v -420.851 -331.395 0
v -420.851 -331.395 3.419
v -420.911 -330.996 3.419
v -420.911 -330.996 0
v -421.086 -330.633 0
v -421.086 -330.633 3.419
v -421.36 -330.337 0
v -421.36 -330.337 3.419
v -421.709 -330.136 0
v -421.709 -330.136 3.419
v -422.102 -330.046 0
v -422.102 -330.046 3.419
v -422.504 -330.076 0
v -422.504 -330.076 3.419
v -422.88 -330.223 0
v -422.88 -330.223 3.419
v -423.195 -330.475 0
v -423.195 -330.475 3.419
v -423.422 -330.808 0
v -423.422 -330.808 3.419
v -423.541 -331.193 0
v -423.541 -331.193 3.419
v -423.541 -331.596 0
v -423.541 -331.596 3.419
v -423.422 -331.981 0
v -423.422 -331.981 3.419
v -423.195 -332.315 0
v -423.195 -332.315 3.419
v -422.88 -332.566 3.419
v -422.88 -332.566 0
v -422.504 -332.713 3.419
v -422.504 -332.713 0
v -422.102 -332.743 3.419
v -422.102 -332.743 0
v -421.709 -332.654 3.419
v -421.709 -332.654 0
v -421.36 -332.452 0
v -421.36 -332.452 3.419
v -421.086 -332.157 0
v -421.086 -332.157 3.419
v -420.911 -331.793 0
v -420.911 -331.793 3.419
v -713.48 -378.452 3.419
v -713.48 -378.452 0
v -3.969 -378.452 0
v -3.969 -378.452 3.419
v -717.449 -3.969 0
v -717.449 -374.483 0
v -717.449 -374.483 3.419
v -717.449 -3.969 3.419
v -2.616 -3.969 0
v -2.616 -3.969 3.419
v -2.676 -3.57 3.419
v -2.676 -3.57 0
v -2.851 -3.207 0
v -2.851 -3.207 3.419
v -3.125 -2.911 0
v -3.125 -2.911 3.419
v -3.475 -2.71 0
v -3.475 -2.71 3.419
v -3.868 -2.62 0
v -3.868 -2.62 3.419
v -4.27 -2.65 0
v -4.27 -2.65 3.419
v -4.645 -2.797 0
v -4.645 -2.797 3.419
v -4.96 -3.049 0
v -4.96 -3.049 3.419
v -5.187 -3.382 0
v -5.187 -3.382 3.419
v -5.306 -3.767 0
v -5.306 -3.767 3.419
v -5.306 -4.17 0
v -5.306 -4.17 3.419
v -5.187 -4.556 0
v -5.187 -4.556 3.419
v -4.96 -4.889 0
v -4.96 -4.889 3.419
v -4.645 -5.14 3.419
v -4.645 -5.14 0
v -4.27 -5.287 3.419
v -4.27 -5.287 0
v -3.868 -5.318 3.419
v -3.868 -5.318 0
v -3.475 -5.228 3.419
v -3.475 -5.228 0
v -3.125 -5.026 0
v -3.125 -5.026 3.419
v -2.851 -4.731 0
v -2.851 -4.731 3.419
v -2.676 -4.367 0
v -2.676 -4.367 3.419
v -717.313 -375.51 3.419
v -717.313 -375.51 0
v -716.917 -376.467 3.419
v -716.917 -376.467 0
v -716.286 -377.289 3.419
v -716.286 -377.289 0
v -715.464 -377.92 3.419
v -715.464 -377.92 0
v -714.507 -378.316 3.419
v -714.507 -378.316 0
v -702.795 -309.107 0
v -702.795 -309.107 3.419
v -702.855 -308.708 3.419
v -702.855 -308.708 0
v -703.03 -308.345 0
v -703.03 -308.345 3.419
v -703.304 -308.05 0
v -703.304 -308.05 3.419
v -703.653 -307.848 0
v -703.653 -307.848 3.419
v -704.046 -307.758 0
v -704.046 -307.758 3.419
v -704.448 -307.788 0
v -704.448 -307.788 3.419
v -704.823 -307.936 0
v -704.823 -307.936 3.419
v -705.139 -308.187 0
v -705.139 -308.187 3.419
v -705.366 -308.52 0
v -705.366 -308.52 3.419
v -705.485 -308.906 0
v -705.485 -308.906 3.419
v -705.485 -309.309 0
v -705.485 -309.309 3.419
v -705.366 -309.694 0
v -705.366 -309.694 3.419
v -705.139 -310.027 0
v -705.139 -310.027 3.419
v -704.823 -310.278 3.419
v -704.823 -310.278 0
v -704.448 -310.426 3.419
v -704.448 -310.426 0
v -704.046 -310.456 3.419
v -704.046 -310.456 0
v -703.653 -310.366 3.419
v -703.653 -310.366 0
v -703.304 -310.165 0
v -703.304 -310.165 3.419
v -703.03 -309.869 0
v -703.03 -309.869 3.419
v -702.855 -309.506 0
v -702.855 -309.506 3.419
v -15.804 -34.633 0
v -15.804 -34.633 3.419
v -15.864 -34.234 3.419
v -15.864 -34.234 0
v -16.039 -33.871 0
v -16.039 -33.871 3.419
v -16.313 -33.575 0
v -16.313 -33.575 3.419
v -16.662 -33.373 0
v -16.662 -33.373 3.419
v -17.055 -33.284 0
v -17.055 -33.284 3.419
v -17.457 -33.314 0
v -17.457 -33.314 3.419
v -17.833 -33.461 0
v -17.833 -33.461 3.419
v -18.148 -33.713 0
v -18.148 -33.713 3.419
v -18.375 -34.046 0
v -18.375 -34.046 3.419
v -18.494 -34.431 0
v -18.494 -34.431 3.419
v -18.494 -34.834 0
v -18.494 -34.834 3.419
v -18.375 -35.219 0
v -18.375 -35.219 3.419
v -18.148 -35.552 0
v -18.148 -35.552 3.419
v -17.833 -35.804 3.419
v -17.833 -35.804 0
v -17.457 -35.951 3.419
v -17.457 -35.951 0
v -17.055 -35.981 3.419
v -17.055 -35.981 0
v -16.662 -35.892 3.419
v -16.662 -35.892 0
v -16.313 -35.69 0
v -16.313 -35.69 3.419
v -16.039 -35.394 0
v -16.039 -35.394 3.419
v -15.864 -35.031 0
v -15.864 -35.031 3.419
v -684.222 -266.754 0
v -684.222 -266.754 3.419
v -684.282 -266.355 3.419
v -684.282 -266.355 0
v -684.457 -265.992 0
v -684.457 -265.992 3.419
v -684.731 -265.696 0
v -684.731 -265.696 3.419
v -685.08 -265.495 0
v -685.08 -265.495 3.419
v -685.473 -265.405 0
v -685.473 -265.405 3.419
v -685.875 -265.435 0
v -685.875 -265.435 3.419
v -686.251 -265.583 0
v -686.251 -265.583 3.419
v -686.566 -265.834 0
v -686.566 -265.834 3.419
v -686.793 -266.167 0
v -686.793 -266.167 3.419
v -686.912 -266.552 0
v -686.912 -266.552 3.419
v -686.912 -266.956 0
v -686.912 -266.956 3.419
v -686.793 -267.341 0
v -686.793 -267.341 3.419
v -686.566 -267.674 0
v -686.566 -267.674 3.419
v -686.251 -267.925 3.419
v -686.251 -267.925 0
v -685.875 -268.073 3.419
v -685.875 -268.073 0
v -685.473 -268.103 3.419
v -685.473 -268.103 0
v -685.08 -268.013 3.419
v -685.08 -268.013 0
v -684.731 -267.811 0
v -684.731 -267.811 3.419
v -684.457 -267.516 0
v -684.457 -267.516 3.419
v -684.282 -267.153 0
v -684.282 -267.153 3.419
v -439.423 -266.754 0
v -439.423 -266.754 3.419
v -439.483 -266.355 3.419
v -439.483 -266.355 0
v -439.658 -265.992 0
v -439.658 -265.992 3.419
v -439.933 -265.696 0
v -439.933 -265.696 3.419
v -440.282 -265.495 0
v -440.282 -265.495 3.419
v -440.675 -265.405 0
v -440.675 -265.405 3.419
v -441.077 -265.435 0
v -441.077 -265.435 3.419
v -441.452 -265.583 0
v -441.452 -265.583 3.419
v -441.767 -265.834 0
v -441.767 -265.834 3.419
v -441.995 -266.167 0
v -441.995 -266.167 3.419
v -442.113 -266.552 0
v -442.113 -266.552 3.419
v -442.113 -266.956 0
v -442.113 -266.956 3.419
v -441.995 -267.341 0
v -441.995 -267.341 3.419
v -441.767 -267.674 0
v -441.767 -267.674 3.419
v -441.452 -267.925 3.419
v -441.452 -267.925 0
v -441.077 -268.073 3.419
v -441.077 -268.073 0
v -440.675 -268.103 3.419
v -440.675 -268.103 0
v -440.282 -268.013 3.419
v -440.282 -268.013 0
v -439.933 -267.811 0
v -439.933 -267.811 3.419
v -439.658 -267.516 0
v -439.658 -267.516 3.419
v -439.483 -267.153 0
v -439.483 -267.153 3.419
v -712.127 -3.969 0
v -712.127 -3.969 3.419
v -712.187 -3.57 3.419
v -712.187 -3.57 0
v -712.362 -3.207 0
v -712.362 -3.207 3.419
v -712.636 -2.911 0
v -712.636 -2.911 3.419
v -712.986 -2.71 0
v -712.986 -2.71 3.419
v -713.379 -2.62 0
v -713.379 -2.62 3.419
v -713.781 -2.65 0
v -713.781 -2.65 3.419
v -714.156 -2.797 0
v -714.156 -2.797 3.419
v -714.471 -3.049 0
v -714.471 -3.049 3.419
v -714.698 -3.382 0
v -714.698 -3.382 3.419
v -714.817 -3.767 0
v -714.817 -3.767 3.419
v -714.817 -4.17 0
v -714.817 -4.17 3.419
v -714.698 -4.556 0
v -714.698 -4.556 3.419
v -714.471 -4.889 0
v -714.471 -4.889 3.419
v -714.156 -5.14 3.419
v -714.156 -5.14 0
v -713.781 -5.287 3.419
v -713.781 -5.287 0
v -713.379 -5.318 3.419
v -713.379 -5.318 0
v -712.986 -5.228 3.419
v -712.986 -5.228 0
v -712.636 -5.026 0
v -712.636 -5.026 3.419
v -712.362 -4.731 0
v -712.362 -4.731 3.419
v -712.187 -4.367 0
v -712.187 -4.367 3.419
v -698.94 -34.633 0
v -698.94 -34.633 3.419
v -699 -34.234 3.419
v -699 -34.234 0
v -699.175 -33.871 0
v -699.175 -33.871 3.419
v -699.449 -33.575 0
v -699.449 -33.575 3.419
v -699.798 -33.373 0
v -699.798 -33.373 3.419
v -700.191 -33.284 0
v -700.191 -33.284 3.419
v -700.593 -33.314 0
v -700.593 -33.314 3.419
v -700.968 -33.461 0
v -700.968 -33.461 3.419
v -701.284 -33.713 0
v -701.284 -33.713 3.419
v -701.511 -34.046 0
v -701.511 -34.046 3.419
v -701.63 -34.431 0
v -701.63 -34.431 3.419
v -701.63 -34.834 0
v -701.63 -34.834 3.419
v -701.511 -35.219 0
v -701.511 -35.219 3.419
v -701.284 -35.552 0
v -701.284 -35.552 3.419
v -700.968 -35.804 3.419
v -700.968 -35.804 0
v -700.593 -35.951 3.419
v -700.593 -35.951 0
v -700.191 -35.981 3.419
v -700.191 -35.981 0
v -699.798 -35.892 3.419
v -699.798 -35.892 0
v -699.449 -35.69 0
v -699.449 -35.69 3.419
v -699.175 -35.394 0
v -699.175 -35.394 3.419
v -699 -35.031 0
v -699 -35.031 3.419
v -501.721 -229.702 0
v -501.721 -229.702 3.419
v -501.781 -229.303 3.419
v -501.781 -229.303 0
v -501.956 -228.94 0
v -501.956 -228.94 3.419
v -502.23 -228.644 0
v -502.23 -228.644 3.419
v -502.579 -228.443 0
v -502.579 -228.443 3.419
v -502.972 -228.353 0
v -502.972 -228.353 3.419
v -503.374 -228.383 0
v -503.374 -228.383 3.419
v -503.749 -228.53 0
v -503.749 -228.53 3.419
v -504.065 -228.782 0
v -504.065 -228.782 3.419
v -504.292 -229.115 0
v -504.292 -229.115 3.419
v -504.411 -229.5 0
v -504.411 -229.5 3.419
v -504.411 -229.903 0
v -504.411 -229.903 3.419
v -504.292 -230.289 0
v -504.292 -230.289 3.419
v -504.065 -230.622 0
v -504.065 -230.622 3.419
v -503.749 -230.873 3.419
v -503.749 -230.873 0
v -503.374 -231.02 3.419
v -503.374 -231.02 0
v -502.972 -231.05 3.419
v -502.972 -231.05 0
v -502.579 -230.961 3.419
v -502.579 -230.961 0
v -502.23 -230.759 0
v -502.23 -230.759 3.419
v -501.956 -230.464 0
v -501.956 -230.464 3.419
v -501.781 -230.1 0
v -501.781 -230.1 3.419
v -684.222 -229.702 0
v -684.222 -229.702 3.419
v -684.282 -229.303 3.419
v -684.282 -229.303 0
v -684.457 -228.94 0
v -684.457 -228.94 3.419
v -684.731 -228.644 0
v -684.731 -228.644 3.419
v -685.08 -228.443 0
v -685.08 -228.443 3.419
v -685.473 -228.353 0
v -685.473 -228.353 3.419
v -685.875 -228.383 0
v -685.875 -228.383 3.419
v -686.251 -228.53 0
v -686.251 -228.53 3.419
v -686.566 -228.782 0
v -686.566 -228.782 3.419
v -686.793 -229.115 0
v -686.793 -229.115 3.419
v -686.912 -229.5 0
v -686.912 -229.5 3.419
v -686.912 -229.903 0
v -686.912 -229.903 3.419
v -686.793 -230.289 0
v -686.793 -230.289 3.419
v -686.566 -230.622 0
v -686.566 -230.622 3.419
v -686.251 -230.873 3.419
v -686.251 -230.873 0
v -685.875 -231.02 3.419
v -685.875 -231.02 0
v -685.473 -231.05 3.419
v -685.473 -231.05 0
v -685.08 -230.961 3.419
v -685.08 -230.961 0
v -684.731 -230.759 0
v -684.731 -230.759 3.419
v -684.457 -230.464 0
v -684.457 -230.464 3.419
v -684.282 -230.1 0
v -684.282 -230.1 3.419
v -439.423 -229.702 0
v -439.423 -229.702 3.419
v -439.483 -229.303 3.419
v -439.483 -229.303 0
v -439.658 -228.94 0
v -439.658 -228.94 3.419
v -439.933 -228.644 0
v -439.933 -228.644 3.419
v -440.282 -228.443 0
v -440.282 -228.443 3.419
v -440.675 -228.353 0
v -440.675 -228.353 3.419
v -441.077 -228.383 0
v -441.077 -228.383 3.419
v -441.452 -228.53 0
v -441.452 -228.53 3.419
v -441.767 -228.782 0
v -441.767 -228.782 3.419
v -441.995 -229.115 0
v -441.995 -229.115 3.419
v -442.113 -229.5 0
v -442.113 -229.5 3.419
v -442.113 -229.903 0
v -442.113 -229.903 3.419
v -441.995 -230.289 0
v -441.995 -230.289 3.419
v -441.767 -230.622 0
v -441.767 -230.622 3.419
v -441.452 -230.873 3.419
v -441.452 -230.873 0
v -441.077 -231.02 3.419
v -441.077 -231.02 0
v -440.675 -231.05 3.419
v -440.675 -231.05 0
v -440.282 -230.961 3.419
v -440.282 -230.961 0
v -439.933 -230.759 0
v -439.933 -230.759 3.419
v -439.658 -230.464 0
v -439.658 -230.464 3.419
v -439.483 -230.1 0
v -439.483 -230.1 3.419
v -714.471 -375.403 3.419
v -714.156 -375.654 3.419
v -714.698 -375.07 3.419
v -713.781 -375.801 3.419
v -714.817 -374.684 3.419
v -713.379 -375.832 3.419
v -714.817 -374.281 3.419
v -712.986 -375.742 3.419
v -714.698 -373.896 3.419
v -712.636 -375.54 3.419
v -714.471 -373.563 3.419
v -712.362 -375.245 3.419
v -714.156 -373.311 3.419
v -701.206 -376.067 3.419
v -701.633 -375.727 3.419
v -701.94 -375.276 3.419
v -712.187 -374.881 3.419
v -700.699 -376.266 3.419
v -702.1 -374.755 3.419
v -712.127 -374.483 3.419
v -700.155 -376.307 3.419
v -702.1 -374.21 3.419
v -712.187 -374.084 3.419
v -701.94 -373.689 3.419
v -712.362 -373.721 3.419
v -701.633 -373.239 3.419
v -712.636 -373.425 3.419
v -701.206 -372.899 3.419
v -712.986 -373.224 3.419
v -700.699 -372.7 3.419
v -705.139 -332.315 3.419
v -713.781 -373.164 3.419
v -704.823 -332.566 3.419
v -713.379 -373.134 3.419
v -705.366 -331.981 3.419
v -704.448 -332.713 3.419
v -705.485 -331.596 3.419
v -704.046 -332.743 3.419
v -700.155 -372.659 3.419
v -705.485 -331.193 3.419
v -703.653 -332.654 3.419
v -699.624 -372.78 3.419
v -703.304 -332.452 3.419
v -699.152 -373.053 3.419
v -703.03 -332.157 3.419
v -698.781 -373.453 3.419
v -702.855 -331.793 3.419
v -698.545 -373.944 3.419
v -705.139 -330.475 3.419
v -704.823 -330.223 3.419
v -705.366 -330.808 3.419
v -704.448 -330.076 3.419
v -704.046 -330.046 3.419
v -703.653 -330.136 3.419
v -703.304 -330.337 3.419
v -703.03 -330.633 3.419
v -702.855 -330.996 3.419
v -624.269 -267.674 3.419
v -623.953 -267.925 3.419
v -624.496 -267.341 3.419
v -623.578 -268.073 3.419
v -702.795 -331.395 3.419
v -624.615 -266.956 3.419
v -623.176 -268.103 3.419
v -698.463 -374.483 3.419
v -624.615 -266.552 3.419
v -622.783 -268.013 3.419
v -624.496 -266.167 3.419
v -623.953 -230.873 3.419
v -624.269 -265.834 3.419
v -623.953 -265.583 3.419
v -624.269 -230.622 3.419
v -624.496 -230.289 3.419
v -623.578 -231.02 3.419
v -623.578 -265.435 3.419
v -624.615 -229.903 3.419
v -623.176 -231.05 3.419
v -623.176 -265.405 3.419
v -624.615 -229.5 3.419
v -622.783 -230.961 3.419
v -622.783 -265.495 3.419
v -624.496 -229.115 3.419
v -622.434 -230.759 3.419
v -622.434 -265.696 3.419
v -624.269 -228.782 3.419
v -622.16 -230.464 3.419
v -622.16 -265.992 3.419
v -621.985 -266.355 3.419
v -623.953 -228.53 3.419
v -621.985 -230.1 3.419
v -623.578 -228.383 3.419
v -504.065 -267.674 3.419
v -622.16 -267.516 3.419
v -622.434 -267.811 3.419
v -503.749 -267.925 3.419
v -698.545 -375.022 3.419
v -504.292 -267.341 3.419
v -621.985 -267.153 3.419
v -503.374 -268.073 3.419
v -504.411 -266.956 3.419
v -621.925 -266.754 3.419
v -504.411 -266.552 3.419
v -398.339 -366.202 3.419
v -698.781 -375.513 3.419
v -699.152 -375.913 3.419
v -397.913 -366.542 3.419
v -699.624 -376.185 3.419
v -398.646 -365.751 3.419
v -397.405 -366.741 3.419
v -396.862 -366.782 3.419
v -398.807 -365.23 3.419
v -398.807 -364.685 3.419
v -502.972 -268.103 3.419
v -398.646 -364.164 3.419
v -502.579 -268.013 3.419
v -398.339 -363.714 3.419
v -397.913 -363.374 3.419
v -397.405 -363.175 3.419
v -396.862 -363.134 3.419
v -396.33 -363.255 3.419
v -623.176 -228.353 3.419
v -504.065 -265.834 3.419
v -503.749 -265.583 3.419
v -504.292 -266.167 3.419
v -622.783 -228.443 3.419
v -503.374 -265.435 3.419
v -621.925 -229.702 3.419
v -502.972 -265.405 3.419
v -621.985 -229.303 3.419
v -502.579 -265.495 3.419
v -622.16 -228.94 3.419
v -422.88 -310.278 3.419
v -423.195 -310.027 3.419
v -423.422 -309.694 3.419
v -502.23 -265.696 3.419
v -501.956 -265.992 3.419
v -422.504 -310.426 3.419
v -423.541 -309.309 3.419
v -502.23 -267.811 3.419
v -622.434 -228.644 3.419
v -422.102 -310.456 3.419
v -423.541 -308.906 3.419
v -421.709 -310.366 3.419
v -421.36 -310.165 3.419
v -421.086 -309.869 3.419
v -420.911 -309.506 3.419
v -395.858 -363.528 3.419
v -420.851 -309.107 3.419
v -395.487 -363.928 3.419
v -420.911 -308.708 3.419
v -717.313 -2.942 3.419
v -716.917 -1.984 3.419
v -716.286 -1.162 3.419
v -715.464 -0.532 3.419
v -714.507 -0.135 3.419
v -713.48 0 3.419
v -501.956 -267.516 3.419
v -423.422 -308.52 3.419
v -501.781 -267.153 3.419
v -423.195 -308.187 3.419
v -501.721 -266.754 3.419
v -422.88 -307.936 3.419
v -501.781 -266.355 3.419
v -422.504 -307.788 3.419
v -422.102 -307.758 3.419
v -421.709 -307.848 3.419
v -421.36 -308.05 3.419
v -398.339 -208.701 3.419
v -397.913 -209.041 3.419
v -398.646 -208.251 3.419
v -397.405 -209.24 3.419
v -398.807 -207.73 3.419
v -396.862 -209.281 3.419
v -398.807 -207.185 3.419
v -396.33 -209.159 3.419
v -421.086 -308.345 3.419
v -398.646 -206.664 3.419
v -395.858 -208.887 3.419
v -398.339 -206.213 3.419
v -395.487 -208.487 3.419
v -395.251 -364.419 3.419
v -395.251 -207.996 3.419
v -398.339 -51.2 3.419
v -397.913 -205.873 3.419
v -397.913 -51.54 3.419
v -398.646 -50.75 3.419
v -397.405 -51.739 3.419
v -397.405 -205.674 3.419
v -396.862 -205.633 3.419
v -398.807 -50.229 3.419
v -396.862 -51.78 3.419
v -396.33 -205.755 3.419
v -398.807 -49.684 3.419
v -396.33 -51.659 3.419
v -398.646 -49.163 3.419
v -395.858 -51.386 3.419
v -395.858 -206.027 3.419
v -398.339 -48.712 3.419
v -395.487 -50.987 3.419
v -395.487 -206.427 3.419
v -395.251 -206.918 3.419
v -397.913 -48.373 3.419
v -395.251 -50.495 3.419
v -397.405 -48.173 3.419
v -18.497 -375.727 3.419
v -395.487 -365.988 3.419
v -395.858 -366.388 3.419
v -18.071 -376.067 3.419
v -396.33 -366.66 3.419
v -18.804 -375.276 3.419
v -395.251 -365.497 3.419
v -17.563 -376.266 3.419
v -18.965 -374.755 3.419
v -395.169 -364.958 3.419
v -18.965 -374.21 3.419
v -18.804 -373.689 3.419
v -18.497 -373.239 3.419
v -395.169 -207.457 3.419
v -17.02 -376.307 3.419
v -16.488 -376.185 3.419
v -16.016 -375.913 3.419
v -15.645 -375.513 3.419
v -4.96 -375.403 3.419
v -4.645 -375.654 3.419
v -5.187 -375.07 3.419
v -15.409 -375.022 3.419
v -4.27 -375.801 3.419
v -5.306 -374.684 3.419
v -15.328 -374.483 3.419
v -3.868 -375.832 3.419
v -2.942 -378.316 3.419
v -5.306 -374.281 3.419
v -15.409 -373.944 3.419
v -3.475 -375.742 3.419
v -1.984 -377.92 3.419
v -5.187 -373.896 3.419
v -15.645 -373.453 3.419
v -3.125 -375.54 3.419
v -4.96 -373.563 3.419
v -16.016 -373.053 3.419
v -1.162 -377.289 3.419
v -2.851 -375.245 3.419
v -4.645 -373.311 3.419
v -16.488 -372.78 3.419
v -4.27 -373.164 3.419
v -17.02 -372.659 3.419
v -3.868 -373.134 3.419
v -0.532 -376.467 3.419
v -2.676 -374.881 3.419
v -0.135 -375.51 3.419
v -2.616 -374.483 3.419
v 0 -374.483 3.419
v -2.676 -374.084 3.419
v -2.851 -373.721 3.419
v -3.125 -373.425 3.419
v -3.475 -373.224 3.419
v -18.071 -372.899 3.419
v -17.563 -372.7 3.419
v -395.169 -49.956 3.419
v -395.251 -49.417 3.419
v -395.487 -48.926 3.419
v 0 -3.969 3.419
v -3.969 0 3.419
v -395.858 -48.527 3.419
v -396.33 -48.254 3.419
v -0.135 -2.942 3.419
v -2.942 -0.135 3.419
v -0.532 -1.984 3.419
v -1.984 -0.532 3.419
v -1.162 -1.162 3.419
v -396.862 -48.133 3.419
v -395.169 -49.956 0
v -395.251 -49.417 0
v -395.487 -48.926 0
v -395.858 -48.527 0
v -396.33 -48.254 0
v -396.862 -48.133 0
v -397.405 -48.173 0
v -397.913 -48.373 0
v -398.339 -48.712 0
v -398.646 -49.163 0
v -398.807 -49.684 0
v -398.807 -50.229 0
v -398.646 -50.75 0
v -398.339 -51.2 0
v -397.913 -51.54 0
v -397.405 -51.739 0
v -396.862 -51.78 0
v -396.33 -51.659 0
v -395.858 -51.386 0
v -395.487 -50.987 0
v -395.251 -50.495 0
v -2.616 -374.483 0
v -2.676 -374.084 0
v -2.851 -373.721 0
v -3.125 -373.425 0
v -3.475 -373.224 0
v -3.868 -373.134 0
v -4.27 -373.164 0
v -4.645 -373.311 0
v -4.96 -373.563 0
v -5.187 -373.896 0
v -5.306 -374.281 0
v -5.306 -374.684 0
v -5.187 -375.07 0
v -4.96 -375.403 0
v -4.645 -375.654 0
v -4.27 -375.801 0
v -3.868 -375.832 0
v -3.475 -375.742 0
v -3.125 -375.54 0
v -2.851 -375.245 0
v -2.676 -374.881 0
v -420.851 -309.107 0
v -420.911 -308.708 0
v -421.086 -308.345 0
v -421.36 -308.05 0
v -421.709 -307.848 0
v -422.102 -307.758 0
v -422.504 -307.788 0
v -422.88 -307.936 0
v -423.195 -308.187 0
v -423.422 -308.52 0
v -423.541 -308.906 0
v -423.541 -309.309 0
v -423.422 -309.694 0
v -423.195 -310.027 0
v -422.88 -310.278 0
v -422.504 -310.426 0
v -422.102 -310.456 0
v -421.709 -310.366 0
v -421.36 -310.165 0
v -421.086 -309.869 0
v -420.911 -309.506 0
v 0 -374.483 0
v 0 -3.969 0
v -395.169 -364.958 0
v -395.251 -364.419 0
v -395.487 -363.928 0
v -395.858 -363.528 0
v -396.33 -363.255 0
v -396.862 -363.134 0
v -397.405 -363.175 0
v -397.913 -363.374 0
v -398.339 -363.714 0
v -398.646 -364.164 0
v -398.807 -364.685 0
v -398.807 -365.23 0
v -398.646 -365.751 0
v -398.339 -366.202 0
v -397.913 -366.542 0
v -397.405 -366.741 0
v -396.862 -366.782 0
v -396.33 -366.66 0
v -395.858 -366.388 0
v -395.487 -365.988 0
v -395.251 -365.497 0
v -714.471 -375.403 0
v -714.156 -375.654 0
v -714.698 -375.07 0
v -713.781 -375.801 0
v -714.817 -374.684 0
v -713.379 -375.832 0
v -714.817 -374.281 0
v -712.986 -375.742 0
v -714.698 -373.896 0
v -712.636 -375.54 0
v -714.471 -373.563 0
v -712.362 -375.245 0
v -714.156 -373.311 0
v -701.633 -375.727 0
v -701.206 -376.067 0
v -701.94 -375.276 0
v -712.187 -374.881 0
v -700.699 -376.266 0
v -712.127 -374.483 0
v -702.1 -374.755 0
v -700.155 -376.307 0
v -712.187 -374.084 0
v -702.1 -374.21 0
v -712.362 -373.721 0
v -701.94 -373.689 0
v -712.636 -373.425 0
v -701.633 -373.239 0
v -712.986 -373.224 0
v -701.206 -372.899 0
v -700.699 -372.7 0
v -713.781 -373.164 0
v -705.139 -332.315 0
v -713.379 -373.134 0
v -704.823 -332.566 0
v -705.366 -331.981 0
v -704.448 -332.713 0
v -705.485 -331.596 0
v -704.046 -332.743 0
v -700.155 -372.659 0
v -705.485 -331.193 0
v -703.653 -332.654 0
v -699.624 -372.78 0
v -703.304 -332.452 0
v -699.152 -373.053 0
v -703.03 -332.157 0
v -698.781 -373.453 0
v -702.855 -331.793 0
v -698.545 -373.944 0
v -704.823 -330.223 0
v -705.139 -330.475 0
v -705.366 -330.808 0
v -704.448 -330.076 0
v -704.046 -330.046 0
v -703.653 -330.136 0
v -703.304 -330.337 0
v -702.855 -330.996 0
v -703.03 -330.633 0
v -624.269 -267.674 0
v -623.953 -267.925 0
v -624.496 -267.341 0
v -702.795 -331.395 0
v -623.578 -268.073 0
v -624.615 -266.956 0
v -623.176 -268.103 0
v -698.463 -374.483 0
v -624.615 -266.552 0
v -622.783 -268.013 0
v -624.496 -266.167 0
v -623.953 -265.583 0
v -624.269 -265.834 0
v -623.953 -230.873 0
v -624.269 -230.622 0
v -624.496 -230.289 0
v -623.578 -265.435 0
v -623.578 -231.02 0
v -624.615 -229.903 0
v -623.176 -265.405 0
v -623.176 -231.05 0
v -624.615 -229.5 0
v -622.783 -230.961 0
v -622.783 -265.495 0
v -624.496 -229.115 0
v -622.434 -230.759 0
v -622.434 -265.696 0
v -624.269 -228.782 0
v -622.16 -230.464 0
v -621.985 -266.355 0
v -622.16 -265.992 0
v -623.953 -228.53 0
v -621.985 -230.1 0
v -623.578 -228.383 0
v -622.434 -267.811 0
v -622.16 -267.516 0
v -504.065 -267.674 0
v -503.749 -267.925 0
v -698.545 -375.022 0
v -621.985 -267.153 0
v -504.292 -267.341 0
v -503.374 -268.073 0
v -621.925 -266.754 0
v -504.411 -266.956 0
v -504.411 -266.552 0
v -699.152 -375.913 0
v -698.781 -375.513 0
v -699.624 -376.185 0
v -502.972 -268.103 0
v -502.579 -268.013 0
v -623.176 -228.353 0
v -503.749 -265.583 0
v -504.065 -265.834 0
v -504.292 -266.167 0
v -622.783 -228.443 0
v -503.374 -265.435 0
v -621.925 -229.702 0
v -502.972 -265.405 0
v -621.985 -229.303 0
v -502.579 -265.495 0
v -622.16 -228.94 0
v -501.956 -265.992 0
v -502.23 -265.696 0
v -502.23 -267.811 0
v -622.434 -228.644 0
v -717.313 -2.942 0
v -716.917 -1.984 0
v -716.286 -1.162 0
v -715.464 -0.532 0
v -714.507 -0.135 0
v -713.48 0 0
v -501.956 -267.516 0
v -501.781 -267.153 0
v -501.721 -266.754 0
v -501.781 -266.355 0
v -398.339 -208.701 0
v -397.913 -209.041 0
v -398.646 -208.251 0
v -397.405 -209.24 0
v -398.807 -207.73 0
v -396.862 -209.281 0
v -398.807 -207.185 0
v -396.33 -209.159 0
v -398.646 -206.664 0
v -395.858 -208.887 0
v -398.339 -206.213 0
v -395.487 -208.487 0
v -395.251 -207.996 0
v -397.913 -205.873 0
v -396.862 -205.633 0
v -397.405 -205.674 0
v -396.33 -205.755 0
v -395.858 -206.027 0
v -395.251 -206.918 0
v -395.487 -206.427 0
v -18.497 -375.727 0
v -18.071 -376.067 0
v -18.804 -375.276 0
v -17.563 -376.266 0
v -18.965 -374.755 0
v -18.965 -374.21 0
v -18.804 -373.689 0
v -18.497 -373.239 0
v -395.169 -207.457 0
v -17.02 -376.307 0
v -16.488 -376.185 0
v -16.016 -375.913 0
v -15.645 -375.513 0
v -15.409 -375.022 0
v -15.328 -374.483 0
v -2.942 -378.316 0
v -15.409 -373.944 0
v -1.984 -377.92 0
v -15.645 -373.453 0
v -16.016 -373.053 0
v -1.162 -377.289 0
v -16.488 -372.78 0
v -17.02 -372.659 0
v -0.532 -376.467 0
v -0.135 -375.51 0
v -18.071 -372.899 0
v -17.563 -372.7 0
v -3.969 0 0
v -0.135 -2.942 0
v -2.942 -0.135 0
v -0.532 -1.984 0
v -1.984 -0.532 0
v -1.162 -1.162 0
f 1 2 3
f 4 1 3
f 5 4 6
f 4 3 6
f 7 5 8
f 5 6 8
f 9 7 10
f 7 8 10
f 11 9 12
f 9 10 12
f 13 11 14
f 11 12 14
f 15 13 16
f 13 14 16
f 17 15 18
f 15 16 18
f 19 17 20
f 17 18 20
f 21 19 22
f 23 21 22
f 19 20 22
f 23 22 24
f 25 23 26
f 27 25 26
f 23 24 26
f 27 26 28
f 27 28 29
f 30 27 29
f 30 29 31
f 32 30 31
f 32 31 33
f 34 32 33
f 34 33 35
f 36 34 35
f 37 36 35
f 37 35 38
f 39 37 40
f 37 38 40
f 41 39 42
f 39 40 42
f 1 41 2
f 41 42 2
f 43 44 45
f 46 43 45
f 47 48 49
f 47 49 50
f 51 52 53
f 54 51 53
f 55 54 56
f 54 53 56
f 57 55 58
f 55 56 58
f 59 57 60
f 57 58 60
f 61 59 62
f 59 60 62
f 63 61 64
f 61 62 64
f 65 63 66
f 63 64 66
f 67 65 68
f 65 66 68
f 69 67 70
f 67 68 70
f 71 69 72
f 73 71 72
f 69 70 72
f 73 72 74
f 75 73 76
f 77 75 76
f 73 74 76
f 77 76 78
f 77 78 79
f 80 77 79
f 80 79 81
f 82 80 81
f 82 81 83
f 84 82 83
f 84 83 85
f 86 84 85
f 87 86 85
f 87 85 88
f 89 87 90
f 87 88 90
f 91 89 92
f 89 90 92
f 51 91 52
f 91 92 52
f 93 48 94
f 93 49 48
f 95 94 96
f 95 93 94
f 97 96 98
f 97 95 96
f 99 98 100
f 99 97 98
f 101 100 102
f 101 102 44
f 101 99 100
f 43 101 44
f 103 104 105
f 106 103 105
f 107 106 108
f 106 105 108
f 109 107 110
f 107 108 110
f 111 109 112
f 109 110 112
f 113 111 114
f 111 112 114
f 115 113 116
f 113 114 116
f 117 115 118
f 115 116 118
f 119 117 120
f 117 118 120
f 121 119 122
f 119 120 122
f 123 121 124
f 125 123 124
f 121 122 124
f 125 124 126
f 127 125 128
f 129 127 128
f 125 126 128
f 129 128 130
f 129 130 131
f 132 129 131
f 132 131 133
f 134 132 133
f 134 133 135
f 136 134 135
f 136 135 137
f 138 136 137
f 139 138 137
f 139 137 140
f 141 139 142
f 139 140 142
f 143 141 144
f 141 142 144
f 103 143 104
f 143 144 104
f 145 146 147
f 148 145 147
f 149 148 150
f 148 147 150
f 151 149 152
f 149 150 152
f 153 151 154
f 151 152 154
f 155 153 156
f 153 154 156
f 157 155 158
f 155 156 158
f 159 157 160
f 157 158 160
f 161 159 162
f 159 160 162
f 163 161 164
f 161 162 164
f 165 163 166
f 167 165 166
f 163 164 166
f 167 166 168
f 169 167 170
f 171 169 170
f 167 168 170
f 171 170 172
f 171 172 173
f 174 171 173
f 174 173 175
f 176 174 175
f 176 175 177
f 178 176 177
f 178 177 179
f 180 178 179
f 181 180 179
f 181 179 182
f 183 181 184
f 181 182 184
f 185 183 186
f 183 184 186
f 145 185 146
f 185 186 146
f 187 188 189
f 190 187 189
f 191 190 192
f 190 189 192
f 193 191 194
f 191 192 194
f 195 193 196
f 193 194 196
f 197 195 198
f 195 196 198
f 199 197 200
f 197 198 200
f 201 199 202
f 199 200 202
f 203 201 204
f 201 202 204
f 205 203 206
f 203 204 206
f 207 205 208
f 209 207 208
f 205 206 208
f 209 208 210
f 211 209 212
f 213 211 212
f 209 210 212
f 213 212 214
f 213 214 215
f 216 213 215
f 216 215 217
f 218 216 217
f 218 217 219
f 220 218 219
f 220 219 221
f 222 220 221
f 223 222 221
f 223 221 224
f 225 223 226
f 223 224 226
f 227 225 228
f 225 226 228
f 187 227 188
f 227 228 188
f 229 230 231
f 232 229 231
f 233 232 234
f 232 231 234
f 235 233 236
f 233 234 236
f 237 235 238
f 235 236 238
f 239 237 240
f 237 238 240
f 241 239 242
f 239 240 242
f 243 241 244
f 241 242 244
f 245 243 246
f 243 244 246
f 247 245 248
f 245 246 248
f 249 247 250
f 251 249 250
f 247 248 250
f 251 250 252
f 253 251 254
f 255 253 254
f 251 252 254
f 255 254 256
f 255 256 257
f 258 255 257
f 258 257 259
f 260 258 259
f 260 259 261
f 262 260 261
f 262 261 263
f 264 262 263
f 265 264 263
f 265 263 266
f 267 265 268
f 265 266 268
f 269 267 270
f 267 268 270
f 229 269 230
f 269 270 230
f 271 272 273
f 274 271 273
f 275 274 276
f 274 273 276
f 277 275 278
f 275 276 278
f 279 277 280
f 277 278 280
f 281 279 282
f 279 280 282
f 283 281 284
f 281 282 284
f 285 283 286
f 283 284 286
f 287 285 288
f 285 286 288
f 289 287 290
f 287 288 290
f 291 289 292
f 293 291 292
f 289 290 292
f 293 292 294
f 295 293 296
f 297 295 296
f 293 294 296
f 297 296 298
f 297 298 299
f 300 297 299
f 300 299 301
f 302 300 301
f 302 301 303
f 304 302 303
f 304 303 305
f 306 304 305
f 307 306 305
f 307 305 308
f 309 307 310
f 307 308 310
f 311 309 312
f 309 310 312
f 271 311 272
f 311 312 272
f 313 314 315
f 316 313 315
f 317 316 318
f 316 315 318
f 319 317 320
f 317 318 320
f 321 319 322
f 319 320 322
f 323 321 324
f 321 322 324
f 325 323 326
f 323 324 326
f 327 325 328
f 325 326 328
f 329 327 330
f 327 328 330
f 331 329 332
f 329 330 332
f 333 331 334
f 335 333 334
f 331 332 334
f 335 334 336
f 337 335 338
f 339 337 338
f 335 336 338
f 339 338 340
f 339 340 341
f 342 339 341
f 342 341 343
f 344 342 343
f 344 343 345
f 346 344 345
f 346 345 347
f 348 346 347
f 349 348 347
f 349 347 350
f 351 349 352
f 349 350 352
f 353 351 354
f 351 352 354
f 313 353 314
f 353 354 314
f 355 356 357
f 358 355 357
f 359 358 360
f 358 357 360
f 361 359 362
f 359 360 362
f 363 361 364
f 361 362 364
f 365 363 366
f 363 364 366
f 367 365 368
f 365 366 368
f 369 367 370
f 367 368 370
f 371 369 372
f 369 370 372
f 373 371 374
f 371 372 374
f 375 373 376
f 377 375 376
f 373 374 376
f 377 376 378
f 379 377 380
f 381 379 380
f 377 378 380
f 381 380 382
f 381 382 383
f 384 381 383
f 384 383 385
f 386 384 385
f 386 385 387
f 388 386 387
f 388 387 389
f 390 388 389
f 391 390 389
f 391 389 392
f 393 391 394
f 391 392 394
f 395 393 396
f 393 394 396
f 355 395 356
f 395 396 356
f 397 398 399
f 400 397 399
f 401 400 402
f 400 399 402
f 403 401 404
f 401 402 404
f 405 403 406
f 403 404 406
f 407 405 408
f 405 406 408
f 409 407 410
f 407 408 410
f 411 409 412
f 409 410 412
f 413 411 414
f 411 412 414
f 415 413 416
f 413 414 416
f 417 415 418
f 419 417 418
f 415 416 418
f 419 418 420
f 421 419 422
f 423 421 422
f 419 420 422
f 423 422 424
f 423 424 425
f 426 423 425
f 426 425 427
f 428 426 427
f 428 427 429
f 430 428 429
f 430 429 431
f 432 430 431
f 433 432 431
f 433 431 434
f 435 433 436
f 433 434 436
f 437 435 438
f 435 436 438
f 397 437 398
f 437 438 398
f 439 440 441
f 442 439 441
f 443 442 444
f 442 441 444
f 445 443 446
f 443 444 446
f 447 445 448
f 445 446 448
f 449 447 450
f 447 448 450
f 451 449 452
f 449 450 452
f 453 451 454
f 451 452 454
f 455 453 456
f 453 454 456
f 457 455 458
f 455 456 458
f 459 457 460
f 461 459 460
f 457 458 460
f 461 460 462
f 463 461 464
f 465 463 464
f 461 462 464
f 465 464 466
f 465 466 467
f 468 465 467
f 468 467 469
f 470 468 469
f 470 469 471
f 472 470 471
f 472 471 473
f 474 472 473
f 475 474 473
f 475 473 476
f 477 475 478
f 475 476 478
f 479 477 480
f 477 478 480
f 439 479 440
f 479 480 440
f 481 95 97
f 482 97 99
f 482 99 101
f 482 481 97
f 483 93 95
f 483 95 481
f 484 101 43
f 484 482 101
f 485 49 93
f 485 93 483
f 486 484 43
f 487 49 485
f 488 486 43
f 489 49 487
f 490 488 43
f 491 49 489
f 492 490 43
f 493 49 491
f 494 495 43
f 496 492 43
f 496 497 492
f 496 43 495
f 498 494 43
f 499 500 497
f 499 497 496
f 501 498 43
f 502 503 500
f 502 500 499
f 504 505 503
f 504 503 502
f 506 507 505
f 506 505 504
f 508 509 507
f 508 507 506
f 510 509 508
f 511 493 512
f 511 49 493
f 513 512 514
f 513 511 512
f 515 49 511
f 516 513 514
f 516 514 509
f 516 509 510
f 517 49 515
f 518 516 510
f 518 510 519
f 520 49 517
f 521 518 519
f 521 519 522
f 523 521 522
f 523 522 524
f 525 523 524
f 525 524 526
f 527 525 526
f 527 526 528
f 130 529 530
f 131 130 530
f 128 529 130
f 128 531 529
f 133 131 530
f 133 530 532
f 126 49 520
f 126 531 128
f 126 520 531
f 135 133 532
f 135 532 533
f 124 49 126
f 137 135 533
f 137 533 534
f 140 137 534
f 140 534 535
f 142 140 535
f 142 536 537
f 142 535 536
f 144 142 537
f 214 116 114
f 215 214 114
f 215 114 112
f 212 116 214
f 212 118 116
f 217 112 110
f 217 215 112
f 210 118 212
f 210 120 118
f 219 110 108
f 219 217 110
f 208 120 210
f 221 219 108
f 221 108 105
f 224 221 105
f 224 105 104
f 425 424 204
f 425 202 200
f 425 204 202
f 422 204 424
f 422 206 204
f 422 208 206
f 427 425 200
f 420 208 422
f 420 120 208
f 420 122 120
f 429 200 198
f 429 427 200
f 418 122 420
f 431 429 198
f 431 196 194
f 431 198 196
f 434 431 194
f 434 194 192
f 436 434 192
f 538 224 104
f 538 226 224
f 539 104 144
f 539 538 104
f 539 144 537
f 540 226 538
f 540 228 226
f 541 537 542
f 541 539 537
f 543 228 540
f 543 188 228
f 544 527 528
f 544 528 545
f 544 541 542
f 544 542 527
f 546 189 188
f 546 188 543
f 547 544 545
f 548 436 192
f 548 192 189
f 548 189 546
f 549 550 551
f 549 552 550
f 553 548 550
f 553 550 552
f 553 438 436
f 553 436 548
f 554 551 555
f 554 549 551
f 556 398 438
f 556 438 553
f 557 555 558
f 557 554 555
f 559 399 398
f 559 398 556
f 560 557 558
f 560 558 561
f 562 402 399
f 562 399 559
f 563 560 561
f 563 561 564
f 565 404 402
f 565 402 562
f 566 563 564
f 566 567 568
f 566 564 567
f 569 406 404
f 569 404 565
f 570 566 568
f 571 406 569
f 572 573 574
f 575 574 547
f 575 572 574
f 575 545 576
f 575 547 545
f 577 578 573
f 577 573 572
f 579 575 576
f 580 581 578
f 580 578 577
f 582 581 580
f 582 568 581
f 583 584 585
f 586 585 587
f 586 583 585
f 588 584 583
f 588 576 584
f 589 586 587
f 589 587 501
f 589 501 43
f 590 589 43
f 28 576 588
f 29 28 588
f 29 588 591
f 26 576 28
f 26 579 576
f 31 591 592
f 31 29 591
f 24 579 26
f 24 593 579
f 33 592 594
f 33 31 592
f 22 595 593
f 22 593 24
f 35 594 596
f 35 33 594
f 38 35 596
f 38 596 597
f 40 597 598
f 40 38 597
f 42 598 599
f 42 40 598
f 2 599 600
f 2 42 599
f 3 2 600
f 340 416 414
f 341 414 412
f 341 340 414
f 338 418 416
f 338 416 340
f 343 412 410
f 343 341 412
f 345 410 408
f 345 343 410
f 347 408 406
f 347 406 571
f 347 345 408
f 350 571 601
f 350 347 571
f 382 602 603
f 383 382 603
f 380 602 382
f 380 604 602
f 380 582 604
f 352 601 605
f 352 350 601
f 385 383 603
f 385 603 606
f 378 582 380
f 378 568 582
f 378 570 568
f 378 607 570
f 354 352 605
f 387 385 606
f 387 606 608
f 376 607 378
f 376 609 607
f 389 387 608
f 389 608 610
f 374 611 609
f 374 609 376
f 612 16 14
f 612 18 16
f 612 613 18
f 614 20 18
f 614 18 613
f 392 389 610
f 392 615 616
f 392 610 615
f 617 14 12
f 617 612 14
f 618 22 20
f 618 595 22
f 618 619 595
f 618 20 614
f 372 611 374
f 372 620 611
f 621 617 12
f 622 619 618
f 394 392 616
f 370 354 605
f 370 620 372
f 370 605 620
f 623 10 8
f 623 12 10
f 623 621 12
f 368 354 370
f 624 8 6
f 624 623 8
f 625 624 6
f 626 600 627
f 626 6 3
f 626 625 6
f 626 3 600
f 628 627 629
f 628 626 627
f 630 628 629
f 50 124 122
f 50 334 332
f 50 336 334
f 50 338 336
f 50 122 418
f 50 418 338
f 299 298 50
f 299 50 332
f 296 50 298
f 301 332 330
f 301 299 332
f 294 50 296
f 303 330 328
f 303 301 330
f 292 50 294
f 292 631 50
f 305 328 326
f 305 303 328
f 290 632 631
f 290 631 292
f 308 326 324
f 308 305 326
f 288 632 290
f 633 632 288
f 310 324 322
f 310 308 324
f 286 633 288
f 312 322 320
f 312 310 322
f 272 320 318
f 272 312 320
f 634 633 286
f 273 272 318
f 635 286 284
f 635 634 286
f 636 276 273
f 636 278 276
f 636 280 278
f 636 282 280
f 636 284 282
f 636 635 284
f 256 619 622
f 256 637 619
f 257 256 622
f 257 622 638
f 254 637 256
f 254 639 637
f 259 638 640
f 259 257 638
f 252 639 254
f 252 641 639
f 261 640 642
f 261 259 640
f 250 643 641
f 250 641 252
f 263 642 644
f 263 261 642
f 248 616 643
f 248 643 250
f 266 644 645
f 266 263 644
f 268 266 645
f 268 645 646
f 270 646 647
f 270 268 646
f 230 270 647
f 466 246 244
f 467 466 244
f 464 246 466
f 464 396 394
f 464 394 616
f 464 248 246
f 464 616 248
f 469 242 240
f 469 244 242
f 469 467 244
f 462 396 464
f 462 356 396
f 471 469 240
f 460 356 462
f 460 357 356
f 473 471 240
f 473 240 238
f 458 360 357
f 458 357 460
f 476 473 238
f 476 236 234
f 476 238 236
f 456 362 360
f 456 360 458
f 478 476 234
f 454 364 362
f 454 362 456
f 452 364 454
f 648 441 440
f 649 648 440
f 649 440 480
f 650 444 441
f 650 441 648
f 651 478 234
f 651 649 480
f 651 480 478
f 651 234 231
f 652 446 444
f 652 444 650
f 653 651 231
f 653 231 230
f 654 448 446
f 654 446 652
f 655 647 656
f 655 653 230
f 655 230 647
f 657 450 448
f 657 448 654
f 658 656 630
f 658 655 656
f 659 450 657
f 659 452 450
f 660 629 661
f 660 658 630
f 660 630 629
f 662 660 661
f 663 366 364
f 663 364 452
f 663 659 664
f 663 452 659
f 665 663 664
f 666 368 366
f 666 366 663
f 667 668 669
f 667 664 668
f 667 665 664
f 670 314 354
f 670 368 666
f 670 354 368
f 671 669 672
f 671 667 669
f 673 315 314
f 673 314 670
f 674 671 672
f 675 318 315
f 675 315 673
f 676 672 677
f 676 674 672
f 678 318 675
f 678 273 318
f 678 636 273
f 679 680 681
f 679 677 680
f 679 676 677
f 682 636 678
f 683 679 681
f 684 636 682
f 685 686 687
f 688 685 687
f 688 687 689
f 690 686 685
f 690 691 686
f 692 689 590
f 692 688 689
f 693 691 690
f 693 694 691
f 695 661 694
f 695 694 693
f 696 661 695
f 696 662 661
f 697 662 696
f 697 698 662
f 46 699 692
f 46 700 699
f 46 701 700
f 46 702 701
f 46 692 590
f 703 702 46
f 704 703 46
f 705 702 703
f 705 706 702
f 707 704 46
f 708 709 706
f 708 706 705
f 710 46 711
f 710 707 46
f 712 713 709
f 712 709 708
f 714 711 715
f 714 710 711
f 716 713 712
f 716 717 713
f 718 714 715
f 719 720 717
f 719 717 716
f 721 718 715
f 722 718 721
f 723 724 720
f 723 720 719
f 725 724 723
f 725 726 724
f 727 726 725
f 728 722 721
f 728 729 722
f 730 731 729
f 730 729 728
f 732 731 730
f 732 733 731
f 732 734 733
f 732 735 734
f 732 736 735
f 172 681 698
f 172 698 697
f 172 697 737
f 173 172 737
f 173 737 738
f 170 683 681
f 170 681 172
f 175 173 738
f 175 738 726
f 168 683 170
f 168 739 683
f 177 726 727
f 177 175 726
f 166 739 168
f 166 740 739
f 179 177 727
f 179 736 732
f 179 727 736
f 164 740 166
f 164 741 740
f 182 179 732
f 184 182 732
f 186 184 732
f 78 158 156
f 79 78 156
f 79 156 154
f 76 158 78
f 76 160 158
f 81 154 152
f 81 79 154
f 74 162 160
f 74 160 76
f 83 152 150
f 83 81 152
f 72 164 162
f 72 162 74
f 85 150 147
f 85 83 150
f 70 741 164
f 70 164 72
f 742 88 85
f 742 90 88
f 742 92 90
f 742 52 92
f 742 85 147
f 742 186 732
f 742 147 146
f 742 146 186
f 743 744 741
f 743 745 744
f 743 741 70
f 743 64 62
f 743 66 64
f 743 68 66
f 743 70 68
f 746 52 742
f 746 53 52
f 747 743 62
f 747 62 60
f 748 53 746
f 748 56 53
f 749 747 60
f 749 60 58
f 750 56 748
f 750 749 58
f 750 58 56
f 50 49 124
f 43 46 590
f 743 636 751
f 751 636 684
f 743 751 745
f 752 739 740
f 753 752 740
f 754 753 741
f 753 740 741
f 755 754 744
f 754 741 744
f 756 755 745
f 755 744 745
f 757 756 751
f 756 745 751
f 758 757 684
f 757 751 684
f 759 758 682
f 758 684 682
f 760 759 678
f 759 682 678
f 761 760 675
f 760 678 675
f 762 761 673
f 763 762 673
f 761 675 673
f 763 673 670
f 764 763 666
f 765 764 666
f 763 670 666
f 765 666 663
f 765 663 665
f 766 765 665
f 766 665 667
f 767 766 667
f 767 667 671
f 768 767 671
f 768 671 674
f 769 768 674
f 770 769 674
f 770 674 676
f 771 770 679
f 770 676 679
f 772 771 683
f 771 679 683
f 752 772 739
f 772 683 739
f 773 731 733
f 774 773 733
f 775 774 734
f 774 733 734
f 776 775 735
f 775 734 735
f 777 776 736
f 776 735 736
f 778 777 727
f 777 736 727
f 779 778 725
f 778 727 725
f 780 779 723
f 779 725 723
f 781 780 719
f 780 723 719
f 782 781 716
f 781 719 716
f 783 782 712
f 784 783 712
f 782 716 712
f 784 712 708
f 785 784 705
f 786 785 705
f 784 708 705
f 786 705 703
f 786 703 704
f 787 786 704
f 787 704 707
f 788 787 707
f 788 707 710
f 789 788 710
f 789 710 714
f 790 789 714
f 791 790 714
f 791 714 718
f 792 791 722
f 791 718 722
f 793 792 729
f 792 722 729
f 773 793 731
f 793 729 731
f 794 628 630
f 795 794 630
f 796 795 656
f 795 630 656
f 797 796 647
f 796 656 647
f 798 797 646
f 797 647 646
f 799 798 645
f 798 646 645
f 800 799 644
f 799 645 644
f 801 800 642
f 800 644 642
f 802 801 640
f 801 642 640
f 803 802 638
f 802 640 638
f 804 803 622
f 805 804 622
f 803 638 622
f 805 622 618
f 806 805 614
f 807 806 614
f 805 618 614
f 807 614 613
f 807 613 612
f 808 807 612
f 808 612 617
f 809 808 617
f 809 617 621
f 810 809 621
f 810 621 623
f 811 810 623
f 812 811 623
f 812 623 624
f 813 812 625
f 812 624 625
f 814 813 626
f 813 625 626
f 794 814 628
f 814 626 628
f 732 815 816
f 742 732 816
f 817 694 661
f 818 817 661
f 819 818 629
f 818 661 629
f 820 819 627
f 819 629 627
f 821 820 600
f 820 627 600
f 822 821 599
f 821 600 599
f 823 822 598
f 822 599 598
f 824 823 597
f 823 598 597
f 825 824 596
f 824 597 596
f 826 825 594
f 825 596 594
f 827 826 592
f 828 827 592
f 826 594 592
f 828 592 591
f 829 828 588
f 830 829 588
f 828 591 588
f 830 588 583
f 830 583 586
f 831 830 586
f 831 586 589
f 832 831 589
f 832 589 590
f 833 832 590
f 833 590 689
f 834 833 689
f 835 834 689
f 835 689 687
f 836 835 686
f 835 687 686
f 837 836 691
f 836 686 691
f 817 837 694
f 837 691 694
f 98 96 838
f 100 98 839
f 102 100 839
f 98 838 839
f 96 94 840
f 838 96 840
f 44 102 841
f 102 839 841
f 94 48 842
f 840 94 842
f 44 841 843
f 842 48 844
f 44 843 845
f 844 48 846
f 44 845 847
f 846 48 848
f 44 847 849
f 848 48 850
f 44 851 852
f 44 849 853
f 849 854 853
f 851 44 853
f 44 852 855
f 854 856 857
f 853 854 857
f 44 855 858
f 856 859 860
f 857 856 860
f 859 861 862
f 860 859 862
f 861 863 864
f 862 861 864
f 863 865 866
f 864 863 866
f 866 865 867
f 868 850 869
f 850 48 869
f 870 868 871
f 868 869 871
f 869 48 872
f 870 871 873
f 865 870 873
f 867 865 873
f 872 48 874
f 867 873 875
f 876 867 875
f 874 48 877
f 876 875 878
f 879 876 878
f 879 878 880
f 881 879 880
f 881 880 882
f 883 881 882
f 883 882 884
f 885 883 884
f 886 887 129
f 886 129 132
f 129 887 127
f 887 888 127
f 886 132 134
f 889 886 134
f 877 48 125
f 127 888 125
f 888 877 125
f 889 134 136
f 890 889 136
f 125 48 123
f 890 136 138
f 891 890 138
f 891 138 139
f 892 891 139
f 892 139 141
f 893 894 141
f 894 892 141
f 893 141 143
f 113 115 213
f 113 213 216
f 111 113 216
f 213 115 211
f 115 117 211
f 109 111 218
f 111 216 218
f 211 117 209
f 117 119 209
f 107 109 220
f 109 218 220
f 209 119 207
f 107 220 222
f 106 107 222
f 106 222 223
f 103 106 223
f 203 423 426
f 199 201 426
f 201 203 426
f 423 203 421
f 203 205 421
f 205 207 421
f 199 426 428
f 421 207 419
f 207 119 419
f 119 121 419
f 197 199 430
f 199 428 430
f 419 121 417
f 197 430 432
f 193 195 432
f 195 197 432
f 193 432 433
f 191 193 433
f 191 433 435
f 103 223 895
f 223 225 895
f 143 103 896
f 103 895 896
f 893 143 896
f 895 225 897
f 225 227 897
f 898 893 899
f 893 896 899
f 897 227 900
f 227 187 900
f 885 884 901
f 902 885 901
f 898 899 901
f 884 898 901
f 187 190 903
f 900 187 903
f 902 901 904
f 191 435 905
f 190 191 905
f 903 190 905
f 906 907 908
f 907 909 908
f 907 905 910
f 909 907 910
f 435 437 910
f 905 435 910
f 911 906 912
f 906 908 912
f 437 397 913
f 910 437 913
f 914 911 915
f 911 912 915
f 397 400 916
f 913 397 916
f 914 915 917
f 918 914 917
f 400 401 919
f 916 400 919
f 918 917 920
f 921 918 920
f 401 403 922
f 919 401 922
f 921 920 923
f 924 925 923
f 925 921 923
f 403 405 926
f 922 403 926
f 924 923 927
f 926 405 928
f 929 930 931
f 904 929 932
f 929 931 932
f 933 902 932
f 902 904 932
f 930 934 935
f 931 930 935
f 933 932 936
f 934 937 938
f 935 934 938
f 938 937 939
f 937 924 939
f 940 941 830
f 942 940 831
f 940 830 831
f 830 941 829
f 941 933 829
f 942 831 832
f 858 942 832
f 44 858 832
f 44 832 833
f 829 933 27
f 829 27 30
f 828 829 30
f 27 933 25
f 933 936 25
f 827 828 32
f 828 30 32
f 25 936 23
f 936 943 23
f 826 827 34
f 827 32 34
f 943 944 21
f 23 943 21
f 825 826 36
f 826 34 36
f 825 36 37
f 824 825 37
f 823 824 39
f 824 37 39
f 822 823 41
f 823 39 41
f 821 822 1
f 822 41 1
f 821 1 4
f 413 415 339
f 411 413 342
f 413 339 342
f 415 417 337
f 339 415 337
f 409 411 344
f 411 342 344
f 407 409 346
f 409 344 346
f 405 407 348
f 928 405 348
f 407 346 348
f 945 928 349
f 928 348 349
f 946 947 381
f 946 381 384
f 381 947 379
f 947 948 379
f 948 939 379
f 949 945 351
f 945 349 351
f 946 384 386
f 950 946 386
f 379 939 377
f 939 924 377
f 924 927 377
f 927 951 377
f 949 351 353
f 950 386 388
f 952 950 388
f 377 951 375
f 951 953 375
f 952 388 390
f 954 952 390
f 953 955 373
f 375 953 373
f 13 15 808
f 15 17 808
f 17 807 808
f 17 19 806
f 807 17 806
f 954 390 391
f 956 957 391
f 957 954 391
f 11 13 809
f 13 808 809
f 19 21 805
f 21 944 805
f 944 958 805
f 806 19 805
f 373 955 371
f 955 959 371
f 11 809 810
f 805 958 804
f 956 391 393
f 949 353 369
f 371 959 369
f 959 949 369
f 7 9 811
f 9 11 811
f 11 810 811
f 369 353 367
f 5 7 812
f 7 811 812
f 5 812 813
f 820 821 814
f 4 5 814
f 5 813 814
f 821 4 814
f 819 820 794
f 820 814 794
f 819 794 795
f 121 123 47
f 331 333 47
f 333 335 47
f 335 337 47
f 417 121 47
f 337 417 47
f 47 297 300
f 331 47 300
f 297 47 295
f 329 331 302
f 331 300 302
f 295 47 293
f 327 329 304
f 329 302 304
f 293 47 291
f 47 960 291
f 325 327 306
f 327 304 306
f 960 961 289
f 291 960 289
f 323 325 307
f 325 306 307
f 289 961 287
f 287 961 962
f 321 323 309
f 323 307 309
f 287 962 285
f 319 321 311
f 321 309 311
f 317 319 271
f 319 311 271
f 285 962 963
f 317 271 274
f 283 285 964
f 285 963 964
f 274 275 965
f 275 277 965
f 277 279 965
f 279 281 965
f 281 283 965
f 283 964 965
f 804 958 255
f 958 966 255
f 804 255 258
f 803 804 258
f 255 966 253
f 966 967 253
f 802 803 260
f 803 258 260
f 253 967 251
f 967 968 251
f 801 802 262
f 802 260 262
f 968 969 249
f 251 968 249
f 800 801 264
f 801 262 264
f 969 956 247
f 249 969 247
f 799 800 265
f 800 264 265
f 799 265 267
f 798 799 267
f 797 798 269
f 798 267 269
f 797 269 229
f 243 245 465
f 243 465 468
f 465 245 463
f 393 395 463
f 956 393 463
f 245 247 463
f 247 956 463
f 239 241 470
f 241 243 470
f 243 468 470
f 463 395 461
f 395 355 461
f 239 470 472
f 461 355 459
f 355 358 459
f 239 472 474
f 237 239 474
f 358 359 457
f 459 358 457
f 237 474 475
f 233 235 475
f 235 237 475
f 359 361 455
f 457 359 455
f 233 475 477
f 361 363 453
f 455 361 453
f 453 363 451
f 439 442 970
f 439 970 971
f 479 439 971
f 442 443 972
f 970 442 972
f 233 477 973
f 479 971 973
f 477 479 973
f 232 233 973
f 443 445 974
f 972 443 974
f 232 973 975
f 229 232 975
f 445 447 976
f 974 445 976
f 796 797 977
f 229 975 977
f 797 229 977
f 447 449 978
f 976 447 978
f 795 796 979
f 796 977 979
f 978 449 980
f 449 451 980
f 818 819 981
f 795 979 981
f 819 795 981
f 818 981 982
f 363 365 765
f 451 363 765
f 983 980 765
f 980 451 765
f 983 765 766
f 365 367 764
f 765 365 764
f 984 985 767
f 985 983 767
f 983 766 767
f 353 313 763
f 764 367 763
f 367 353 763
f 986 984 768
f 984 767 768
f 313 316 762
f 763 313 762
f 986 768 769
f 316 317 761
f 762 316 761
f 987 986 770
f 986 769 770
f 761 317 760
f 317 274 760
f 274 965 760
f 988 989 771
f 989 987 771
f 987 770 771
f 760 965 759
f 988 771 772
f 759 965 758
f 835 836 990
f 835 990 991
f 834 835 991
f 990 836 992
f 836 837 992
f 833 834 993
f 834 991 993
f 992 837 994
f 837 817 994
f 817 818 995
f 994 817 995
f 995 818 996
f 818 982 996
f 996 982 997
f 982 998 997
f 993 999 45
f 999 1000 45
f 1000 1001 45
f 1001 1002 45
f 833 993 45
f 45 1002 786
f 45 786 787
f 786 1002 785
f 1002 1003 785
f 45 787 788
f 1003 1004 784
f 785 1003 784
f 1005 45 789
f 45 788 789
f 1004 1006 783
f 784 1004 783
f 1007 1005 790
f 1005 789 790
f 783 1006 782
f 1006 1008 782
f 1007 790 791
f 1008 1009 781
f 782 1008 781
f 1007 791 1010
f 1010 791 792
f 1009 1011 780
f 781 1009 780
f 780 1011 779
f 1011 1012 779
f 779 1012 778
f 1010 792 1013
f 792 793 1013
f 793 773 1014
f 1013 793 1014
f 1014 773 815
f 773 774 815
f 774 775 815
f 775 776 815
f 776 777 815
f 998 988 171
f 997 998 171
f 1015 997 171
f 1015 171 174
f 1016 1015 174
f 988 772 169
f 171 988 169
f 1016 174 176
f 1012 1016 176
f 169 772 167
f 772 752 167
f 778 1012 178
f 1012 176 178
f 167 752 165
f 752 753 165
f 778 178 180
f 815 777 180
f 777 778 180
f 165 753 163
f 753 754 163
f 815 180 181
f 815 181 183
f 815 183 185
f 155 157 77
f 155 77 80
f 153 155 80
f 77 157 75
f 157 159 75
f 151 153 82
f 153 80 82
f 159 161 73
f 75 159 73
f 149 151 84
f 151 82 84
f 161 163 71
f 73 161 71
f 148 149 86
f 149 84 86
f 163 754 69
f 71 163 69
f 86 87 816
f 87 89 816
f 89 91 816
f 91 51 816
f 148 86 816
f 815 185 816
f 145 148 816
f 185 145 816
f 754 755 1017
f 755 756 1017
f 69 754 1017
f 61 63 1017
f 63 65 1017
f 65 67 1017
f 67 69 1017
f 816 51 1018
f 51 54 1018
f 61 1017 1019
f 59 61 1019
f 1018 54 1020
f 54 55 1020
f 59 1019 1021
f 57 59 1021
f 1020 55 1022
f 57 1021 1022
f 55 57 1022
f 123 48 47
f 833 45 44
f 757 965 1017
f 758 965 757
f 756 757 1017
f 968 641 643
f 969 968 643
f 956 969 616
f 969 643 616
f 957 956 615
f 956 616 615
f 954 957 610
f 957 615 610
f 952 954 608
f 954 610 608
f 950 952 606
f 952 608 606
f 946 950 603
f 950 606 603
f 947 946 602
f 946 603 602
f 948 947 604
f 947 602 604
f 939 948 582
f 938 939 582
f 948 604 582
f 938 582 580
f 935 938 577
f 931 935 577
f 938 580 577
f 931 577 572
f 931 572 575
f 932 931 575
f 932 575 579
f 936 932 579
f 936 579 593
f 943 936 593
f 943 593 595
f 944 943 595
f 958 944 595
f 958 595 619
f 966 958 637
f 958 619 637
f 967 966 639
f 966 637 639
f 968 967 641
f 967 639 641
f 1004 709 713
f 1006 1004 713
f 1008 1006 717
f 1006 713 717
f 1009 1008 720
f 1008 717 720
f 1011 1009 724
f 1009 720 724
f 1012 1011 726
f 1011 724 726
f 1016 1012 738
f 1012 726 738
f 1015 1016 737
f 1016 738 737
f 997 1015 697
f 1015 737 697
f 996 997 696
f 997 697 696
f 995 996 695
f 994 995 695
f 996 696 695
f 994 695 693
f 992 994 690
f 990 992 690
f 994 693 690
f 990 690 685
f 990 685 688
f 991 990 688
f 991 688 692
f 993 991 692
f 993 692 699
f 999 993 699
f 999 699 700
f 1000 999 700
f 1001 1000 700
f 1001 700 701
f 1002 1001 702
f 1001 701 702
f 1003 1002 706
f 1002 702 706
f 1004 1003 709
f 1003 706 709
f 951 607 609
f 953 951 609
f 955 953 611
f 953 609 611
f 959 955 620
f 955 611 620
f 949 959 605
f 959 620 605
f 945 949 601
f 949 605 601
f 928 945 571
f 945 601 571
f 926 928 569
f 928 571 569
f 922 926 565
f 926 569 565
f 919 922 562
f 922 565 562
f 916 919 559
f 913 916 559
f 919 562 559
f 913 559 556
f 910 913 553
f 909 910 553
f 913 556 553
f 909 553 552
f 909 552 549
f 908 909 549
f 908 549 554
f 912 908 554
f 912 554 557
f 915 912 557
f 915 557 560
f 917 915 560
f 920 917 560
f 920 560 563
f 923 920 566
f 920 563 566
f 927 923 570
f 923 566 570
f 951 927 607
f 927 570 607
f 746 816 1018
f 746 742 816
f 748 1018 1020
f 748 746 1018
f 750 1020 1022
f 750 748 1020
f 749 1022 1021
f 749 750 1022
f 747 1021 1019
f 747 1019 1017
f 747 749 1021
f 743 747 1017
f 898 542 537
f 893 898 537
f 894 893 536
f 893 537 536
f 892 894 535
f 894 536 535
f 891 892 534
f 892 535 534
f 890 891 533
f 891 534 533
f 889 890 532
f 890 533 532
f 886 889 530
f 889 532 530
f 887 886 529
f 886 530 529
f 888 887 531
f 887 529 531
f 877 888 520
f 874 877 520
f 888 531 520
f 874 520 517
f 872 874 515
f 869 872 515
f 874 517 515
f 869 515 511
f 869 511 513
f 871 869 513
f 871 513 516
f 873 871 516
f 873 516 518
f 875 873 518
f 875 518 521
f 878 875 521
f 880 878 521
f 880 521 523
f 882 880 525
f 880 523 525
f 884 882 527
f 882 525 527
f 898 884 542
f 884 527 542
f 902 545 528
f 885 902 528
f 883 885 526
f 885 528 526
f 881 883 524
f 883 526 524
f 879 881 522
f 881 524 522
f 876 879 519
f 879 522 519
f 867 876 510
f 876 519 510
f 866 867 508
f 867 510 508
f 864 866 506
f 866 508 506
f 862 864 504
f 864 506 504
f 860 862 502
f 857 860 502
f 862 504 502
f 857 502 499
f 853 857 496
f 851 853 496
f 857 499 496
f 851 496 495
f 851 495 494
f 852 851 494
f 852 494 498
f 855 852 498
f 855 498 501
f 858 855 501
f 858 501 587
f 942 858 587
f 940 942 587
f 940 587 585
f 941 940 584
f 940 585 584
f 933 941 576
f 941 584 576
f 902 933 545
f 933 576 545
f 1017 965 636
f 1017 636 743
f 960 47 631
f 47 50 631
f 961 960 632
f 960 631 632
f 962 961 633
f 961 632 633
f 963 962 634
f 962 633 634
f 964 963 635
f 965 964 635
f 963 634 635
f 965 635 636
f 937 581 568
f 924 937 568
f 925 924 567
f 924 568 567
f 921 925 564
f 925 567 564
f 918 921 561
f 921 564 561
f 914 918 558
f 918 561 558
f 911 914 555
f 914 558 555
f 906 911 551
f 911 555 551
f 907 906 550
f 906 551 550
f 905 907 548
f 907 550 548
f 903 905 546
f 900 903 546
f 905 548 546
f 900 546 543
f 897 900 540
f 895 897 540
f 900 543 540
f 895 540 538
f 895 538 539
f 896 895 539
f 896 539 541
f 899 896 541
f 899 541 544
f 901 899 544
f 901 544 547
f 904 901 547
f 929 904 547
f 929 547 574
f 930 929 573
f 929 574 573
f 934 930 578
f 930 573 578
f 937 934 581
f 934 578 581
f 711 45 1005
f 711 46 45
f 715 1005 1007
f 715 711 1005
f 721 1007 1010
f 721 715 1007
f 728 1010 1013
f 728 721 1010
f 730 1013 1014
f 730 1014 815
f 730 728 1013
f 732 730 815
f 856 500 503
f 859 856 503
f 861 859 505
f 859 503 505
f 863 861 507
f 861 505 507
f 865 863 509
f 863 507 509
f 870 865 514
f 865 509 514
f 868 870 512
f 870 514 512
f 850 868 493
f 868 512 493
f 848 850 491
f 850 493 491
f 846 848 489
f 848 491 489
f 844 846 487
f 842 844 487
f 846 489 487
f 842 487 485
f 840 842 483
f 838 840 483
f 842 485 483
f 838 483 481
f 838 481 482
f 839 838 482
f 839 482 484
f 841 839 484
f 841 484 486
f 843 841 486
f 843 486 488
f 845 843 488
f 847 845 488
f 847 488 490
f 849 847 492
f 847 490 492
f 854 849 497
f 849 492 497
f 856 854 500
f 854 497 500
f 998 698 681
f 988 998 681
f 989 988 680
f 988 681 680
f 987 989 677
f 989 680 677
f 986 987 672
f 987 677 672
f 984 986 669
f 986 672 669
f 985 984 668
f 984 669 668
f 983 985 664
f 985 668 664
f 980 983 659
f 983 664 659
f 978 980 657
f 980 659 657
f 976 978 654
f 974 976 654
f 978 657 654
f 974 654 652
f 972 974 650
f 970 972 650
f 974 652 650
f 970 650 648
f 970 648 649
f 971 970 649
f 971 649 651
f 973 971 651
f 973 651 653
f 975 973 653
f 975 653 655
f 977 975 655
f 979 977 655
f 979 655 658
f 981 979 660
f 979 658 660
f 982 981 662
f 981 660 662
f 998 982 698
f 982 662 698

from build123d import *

# Parameters (mm, degrees)
F0_W     = 717.448502
F0_H     = 378.451567
F1_DEPTH = 3.41884
F2_R     = 3.96875
F3_R     = 1.35255
F3_R_2   = 1.8288
F4_DEPTH = 3.41884


with BuildPart() as f1:
    # F0 (on Top) → F1 (new body)
    with BuildSketch(Plane.XY):
        with Locations((-358.724251, -189.225783)):
            Rectangle(F0_W, F0_H)
    extrude(amount=F1_DEPTH)

    # F2
    f2_edges = [f1.edges().sort_by_distance(p)[0] for p in [
        (-717.448502, 0, 1.70942),
        (-717.448502, -378.451567, 1.70942),
        (0, -378.451567, 1.70942),
        (0, 0, 1.70942),
    ]]
    fillet(f2_edges, radius=F2_R)

    # F3 (on face) → F4 (cut, through all)
    with BuildSketch(Plane.XY.offset(3.41884)):
        with Locations((-713.479752, -3.96875)):
            Circle(F3_R)
        with Locations((-3.96875, -3.96875)):
            Circle(F3_R)
        with Locations((-713.479752, -374.482817)):
            Circle(F3_R)
        with Locations((-3.96875, -374.482817)):
            Circle(F3_R)
        with Locations((-704.147131, -309.107129)):
            Circle(F3_R)
        with Locations((-704.147131, -331.394638)):
            Circle(F3_R)
        with Locations((-422.20327, -331.394638)):
            Circle(F3_R)
        with Locations((-422.20327, -309.107129)):
            Circle(F3_R)
        with Locations((-17.15643, -374.482817)):
            Circle(F3_R_2)
        with Locations((-700.292072, -374.482817)):
            Circle(F3_R_2)
        with Locations((-440.775923, -266.753932)):
            Circle(F3_R)
        with Locations((-440.775923, -229.701708)):
            Circle(F3_R)
        with Locations((-503.073208, -229.701708)):
            Circle(F3_R)
        with Locations((-503.073208, -266.753932)):
            Circle(F3_R)
        with Locations((-700.292072, -34.632519)):
            Circle(F3_R)
        with Locations((-17.15643, -34.632519)):
            Circle(F3_R)
        with Locations((-623.277194, -266.753932)):
            Circle(F3_R)
        with Locations((-623.277194, -229.701708)):
            Circle(F3_R)
        with Locations((-685.574478, -229.701708)):
            Circle(F3_R)
        with Locations((-685.574478, -266.753932)):
            Circle(F3_R)
        with Locations((-396.99819, -49.956339)):
            Circle(F3_R_2)
        with Locations((-396.99819, -364.957817)):
            Circle(F3_R_2)
        with Locations((-396.99819, -207.457078)):
            Circle(F3_R_2)
    extrude(amount=-F4_DEPTH, mode=Mode.SUBTRACT)


solid = f1.part
